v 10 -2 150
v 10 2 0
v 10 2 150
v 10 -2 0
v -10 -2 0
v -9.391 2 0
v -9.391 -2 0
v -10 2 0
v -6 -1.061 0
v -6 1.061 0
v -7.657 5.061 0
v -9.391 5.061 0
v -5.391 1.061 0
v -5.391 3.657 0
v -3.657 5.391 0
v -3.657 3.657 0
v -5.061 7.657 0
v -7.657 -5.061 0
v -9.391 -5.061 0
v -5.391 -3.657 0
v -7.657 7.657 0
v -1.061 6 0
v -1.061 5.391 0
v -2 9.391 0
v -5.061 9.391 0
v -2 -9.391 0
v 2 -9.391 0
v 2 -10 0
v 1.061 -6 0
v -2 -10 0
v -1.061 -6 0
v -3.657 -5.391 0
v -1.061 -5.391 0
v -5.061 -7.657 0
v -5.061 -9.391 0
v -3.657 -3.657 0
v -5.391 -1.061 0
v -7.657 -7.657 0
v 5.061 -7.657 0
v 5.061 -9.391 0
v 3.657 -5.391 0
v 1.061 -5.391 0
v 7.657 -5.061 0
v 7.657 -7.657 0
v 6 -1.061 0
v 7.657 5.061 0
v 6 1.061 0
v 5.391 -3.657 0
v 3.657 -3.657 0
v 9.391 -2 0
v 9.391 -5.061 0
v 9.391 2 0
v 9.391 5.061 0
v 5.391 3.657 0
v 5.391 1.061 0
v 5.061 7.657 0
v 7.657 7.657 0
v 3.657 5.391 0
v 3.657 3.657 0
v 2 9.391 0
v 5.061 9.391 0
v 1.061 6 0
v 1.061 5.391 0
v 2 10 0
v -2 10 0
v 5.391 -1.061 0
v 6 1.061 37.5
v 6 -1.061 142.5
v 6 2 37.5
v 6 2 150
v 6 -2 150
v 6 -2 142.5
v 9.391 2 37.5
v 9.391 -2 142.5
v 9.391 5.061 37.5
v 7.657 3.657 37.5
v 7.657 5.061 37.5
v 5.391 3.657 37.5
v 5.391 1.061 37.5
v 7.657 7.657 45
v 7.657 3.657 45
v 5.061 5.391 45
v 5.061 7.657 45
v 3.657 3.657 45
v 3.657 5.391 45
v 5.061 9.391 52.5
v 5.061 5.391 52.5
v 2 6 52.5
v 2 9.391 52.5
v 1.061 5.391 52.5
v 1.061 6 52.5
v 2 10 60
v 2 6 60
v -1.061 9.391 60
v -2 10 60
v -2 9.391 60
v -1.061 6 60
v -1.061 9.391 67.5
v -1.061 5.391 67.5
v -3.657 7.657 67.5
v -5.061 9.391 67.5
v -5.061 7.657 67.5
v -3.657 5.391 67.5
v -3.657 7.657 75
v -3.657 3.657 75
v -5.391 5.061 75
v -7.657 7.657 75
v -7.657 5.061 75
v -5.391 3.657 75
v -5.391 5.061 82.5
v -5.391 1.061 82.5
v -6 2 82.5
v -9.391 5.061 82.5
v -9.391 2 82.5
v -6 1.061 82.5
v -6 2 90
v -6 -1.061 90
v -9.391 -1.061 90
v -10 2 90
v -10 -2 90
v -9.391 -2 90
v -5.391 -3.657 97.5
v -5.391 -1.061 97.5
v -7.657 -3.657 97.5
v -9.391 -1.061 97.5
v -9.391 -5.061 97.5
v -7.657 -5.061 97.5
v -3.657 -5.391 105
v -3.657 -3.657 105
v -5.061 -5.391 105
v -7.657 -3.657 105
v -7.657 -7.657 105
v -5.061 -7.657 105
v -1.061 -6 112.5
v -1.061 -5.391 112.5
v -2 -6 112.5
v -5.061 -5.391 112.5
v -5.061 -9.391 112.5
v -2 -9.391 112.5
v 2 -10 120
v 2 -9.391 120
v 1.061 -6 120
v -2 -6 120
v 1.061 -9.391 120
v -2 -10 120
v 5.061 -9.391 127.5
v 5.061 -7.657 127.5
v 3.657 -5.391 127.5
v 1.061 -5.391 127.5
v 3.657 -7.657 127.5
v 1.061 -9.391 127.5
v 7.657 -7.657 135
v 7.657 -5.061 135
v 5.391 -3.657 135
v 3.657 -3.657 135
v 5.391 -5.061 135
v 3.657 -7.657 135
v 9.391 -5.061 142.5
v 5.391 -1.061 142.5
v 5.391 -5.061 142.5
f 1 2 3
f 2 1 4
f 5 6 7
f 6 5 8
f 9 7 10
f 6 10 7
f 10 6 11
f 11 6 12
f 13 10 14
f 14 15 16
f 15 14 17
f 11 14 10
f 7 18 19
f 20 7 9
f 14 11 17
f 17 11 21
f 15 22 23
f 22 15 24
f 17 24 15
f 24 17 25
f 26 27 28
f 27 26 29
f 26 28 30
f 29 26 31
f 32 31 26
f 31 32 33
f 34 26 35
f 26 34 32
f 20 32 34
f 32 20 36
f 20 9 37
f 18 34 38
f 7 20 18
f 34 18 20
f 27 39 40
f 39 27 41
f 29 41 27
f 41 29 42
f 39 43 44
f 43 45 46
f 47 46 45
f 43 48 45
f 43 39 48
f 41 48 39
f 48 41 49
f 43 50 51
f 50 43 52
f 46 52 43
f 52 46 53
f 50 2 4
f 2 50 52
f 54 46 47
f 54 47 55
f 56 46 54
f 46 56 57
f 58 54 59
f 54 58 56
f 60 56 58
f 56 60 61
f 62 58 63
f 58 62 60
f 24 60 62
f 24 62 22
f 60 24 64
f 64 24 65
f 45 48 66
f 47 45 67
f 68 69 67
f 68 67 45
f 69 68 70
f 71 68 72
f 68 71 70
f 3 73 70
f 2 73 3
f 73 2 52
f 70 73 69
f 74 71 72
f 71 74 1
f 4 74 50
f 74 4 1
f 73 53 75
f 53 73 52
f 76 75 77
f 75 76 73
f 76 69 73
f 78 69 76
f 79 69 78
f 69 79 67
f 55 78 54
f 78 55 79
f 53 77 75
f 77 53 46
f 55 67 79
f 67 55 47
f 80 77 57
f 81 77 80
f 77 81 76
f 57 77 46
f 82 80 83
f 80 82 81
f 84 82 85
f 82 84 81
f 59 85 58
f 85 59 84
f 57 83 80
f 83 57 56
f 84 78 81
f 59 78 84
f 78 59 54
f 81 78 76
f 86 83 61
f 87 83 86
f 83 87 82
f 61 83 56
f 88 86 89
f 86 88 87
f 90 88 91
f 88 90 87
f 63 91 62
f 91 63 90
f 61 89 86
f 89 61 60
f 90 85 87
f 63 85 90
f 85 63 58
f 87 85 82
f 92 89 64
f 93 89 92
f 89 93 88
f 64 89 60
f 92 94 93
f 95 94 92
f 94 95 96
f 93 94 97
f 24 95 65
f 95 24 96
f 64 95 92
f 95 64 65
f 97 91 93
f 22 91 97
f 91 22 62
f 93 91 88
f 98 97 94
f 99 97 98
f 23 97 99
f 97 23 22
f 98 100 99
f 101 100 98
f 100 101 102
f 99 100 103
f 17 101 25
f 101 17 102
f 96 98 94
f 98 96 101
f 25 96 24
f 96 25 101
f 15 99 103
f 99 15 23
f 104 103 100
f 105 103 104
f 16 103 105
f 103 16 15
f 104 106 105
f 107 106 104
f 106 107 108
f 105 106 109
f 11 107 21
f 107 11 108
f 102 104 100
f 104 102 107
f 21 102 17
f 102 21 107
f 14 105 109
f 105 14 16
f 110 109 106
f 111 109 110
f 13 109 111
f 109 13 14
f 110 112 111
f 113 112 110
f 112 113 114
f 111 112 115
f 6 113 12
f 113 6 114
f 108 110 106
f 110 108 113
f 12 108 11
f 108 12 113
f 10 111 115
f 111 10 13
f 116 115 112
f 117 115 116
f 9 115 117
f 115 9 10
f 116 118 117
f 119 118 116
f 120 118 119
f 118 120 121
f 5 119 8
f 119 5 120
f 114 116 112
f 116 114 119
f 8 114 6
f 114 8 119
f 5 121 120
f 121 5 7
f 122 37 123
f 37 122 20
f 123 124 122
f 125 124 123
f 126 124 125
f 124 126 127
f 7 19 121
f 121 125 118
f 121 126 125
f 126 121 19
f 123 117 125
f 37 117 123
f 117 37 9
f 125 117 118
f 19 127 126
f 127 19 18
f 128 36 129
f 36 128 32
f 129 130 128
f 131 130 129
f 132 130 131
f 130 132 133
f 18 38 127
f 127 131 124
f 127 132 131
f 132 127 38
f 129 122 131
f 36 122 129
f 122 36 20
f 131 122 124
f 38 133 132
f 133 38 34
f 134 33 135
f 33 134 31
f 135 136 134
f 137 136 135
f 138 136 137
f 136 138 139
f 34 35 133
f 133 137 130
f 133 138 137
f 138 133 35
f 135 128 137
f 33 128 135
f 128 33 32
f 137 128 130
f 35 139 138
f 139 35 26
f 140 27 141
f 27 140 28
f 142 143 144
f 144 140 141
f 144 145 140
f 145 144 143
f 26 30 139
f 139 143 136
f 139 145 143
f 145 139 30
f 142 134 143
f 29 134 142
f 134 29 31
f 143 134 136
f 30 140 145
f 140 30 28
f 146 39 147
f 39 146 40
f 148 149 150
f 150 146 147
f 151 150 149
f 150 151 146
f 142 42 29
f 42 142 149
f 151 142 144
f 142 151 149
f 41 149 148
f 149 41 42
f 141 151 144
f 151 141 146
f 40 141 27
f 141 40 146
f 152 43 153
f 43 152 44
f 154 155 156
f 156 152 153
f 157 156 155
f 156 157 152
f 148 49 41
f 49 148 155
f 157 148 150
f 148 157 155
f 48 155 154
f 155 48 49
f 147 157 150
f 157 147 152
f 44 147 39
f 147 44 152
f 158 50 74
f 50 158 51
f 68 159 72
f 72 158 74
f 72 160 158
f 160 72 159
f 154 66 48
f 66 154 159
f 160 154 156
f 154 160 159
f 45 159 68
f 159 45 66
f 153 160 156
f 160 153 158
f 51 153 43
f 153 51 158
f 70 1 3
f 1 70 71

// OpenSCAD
//------------------------------------------------------------
// Z calibration           
//------------------------------------------------------------
Diameter = 8; //

$fn=150;
Size =4;

union(){ 
    for (i=[0:7.5:120])
    {
        rotate(i*3)
        translate([Diameter,0,0])
        rotate(-i*3) translate([0,0,0.5*(i+30)]) cube( [Size,Size,i+30], center=true);
    }
}
